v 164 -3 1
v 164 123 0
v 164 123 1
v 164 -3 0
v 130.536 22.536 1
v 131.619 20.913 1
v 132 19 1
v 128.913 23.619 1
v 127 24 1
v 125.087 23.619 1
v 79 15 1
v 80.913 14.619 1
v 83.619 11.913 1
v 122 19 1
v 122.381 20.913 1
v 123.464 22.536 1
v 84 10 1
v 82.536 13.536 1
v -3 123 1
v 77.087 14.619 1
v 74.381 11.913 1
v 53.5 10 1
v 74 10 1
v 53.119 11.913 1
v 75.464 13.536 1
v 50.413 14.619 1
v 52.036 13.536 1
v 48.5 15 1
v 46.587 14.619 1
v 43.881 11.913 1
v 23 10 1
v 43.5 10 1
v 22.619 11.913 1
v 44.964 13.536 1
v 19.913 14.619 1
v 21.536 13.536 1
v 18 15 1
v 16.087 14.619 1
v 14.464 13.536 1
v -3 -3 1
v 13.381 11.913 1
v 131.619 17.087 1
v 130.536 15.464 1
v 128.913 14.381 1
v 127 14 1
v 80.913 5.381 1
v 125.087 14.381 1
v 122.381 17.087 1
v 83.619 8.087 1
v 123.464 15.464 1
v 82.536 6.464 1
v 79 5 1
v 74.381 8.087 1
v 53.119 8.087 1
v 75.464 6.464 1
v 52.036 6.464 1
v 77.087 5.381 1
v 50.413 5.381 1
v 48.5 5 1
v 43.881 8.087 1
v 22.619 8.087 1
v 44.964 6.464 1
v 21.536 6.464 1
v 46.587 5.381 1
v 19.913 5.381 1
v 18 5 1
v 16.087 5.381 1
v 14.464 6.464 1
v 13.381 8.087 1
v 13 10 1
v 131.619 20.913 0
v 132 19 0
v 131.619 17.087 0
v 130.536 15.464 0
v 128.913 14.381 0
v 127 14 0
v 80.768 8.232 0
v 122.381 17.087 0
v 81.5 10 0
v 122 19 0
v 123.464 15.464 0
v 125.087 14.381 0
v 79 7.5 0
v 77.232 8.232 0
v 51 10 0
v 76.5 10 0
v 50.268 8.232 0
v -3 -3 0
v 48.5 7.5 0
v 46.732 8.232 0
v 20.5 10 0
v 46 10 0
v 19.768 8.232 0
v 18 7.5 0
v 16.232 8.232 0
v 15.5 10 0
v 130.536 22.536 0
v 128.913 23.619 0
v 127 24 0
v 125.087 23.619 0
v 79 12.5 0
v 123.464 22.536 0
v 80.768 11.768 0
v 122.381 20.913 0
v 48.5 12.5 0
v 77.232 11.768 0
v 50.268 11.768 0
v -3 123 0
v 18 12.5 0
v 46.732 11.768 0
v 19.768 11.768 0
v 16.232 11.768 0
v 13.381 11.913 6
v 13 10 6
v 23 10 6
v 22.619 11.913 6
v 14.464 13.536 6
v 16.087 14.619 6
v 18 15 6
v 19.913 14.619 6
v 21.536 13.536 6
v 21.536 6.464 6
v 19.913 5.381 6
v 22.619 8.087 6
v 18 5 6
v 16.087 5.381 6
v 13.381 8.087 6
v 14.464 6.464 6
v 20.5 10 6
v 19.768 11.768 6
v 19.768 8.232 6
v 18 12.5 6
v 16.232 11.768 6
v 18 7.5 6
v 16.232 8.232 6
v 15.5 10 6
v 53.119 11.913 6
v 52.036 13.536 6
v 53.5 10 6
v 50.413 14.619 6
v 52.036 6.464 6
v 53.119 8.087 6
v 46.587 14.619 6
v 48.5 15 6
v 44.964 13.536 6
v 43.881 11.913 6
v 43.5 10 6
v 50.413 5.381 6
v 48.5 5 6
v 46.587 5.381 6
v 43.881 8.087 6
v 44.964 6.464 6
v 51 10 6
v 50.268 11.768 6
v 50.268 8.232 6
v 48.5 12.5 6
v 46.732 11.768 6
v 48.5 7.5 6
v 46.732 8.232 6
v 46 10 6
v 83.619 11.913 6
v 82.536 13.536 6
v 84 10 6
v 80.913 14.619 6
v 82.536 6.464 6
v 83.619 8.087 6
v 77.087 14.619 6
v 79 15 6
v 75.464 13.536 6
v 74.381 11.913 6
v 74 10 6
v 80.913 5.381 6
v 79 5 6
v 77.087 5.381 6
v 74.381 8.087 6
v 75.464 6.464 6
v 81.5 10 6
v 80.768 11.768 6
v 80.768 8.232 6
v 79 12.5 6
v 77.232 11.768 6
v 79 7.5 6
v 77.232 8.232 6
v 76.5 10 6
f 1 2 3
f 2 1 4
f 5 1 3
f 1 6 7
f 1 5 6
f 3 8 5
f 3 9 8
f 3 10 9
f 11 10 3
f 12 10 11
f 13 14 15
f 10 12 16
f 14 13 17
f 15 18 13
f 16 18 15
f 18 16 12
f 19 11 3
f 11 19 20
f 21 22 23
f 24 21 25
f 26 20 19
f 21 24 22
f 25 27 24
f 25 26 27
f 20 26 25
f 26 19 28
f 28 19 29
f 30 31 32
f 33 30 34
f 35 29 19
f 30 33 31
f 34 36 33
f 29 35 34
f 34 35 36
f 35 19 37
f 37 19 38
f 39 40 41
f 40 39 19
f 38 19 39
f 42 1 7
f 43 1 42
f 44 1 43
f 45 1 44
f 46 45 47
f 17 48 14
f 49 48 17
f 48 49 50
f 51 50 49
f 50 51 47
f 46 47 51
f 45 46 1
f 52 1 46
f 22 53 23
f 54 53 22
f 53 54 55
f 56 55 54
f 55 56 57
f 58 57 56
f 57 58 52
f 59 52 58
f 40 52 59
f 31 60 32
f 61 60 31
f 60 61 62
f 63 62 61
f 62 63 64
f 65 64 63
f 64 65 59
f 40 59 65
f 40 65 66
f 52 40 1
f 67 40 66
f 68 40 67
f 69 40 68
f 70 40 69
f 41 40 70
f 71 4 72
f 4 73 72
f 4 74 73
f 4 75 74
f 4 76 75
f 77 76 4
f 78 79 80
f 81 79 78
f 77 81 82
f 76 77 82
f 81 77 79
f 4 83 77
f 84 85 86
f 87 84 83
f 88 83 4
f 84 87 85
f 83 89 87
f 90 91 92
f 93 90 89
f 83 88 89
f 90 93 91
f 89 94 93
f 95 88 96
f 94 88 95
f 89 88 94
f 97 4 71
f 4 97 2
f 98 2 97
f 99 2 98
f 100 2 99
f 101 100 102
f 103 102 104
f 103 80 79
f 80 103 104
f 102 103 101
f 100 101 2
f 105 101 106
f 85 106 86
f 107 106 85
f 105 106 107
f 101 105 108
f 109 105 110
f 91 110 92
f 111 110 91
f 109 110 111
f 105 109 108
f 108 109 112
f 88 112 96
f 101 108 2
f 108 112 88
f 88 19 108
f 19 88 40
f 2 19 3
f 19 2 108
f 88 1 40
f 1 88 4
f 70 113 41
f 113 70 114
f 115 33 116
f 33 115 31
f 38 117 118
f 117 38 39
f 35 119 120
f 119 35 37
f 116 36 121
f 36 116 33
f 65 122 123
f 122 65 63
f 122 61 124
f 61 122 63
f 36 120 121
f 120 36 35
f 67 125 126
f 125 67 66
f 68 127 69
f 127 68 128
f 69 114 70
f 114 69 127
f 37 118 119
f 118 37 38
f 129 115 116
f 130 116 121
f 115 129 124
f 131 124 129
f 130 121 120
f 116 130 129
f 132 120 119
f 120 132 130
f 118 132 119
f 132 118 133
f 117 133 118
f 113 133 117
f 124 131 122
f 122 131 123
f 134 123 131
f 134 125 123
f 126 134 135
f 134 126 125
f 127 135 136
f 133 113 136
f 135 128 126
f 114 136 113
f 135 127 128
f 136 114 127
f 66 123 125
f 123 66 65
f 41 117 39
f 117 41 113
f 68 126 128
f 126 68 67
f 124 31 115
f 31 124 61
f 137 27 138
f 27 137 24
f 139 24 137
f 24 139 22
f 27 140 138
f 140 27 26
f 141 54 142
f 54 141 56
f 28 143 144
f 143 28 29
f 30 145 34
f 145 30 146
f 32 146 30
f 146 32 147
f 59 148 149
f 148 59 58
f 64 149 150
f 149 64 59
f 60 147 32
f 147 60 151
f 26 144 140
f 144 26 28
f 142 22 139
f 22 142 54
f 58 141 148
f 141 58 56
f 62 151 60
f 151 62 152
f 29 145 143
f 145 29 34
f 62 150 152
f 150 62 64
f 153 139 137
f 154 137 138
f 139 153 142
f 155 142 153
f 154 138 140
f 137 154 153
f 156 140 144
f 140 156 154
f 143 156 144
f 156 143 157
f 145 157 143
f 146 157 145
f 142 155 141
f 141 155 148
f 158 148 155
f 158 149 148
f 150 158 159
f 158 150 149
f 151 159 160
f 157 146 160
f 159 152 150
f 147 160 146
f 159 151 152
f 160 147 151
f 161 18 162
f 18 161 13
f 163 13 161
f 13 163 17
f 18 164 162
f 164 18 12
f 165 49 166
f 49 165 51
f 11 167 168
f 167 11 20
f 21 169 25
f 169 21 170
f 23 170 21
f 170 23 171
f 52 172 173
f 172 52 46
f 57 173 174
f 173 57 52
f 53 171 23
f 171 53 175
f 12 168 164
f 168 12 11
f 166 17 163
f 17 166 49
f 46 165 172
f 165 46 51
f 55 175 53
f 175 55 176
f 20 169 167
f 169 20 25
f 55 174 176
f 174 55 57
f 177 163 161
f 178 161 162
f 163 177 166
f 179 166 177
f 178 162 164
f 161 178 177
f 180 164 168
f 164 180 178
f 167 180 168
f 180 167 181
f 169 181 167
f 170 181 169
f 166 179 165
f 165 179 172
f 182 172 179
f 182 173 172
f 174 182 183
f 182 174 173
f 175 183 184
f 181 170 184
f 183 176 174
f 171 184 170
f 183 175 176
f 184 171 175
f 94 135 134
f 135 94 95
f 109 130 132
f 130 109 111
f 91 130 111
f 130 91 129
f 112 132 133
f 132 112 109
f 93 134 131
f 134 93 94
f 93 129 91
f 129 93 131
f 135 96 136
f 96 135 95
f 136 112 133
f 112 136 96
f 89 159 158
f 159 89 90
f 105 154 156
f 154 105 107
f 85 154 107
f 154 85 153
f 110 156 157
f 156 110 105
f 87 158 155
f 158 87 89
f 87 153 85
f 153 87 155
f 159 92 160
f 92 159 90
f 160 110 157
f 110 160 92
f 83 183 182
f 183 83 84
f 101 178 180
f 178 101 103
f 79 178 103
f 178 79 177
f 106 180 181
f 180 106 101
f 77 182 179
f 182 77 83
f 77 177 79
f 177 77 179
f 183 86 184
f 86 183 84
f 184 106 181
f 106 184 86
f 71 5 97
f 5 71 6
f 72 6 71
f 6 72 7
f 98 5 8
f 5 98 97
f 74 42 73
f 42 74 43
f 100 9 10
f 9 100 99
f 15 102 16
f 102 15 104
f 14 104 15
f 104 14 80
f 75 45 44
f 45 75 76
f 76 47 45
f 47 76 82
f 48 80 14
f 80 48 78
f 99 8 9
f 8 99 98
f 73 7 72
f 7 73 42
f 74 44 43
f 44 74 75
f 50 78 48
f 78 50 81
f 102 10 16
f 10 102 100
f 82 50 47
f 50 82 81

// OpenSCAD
tolerance=0.5;
pcb_width=161;
pcb_height=120;
pcb_standoff=10;
walls=1;
screen_offset=[50,38];
button1_offset=[18,10];
button2_offset=[48.5,10];
button3_offset=[79,10];
button_height=5;
switch_offset=[127,19];
switch_diameter=10;
module front() {
difference() {
union() {
translate([-2*tolerance-2*walls,-2*tolerance-2*walls,0])cube([pcb_width+4*tolerance+4*walls,pcb_height+4*tolerance+4*walls,walls]);
translate([button1_offset[0],button1_offset[1],walls])cylinder(d=10,h=pcb_standoff-button_height);
translate([button2_offset[0],button2_offset[1],walls])cylinder(d=10,h=pcb_standoff-button_height);
translate([button3_offset[0],button3_offset[1],walls])cylinder(d=10,h=pcb_standoff-button_height);
}
translate(button1_offset)cylinder(d=5,h=pcb_standoff-button_height+walls);
translate(button2_offset)cylinder(d=5,h=pcb_standoff-button_height+walls);
translate(button3_offset)cylinder(d=5,h=pcb_standoff-button_height+walls);
translate(switch_offset)cylinder(d=10,h=walls);


}
}
front();
